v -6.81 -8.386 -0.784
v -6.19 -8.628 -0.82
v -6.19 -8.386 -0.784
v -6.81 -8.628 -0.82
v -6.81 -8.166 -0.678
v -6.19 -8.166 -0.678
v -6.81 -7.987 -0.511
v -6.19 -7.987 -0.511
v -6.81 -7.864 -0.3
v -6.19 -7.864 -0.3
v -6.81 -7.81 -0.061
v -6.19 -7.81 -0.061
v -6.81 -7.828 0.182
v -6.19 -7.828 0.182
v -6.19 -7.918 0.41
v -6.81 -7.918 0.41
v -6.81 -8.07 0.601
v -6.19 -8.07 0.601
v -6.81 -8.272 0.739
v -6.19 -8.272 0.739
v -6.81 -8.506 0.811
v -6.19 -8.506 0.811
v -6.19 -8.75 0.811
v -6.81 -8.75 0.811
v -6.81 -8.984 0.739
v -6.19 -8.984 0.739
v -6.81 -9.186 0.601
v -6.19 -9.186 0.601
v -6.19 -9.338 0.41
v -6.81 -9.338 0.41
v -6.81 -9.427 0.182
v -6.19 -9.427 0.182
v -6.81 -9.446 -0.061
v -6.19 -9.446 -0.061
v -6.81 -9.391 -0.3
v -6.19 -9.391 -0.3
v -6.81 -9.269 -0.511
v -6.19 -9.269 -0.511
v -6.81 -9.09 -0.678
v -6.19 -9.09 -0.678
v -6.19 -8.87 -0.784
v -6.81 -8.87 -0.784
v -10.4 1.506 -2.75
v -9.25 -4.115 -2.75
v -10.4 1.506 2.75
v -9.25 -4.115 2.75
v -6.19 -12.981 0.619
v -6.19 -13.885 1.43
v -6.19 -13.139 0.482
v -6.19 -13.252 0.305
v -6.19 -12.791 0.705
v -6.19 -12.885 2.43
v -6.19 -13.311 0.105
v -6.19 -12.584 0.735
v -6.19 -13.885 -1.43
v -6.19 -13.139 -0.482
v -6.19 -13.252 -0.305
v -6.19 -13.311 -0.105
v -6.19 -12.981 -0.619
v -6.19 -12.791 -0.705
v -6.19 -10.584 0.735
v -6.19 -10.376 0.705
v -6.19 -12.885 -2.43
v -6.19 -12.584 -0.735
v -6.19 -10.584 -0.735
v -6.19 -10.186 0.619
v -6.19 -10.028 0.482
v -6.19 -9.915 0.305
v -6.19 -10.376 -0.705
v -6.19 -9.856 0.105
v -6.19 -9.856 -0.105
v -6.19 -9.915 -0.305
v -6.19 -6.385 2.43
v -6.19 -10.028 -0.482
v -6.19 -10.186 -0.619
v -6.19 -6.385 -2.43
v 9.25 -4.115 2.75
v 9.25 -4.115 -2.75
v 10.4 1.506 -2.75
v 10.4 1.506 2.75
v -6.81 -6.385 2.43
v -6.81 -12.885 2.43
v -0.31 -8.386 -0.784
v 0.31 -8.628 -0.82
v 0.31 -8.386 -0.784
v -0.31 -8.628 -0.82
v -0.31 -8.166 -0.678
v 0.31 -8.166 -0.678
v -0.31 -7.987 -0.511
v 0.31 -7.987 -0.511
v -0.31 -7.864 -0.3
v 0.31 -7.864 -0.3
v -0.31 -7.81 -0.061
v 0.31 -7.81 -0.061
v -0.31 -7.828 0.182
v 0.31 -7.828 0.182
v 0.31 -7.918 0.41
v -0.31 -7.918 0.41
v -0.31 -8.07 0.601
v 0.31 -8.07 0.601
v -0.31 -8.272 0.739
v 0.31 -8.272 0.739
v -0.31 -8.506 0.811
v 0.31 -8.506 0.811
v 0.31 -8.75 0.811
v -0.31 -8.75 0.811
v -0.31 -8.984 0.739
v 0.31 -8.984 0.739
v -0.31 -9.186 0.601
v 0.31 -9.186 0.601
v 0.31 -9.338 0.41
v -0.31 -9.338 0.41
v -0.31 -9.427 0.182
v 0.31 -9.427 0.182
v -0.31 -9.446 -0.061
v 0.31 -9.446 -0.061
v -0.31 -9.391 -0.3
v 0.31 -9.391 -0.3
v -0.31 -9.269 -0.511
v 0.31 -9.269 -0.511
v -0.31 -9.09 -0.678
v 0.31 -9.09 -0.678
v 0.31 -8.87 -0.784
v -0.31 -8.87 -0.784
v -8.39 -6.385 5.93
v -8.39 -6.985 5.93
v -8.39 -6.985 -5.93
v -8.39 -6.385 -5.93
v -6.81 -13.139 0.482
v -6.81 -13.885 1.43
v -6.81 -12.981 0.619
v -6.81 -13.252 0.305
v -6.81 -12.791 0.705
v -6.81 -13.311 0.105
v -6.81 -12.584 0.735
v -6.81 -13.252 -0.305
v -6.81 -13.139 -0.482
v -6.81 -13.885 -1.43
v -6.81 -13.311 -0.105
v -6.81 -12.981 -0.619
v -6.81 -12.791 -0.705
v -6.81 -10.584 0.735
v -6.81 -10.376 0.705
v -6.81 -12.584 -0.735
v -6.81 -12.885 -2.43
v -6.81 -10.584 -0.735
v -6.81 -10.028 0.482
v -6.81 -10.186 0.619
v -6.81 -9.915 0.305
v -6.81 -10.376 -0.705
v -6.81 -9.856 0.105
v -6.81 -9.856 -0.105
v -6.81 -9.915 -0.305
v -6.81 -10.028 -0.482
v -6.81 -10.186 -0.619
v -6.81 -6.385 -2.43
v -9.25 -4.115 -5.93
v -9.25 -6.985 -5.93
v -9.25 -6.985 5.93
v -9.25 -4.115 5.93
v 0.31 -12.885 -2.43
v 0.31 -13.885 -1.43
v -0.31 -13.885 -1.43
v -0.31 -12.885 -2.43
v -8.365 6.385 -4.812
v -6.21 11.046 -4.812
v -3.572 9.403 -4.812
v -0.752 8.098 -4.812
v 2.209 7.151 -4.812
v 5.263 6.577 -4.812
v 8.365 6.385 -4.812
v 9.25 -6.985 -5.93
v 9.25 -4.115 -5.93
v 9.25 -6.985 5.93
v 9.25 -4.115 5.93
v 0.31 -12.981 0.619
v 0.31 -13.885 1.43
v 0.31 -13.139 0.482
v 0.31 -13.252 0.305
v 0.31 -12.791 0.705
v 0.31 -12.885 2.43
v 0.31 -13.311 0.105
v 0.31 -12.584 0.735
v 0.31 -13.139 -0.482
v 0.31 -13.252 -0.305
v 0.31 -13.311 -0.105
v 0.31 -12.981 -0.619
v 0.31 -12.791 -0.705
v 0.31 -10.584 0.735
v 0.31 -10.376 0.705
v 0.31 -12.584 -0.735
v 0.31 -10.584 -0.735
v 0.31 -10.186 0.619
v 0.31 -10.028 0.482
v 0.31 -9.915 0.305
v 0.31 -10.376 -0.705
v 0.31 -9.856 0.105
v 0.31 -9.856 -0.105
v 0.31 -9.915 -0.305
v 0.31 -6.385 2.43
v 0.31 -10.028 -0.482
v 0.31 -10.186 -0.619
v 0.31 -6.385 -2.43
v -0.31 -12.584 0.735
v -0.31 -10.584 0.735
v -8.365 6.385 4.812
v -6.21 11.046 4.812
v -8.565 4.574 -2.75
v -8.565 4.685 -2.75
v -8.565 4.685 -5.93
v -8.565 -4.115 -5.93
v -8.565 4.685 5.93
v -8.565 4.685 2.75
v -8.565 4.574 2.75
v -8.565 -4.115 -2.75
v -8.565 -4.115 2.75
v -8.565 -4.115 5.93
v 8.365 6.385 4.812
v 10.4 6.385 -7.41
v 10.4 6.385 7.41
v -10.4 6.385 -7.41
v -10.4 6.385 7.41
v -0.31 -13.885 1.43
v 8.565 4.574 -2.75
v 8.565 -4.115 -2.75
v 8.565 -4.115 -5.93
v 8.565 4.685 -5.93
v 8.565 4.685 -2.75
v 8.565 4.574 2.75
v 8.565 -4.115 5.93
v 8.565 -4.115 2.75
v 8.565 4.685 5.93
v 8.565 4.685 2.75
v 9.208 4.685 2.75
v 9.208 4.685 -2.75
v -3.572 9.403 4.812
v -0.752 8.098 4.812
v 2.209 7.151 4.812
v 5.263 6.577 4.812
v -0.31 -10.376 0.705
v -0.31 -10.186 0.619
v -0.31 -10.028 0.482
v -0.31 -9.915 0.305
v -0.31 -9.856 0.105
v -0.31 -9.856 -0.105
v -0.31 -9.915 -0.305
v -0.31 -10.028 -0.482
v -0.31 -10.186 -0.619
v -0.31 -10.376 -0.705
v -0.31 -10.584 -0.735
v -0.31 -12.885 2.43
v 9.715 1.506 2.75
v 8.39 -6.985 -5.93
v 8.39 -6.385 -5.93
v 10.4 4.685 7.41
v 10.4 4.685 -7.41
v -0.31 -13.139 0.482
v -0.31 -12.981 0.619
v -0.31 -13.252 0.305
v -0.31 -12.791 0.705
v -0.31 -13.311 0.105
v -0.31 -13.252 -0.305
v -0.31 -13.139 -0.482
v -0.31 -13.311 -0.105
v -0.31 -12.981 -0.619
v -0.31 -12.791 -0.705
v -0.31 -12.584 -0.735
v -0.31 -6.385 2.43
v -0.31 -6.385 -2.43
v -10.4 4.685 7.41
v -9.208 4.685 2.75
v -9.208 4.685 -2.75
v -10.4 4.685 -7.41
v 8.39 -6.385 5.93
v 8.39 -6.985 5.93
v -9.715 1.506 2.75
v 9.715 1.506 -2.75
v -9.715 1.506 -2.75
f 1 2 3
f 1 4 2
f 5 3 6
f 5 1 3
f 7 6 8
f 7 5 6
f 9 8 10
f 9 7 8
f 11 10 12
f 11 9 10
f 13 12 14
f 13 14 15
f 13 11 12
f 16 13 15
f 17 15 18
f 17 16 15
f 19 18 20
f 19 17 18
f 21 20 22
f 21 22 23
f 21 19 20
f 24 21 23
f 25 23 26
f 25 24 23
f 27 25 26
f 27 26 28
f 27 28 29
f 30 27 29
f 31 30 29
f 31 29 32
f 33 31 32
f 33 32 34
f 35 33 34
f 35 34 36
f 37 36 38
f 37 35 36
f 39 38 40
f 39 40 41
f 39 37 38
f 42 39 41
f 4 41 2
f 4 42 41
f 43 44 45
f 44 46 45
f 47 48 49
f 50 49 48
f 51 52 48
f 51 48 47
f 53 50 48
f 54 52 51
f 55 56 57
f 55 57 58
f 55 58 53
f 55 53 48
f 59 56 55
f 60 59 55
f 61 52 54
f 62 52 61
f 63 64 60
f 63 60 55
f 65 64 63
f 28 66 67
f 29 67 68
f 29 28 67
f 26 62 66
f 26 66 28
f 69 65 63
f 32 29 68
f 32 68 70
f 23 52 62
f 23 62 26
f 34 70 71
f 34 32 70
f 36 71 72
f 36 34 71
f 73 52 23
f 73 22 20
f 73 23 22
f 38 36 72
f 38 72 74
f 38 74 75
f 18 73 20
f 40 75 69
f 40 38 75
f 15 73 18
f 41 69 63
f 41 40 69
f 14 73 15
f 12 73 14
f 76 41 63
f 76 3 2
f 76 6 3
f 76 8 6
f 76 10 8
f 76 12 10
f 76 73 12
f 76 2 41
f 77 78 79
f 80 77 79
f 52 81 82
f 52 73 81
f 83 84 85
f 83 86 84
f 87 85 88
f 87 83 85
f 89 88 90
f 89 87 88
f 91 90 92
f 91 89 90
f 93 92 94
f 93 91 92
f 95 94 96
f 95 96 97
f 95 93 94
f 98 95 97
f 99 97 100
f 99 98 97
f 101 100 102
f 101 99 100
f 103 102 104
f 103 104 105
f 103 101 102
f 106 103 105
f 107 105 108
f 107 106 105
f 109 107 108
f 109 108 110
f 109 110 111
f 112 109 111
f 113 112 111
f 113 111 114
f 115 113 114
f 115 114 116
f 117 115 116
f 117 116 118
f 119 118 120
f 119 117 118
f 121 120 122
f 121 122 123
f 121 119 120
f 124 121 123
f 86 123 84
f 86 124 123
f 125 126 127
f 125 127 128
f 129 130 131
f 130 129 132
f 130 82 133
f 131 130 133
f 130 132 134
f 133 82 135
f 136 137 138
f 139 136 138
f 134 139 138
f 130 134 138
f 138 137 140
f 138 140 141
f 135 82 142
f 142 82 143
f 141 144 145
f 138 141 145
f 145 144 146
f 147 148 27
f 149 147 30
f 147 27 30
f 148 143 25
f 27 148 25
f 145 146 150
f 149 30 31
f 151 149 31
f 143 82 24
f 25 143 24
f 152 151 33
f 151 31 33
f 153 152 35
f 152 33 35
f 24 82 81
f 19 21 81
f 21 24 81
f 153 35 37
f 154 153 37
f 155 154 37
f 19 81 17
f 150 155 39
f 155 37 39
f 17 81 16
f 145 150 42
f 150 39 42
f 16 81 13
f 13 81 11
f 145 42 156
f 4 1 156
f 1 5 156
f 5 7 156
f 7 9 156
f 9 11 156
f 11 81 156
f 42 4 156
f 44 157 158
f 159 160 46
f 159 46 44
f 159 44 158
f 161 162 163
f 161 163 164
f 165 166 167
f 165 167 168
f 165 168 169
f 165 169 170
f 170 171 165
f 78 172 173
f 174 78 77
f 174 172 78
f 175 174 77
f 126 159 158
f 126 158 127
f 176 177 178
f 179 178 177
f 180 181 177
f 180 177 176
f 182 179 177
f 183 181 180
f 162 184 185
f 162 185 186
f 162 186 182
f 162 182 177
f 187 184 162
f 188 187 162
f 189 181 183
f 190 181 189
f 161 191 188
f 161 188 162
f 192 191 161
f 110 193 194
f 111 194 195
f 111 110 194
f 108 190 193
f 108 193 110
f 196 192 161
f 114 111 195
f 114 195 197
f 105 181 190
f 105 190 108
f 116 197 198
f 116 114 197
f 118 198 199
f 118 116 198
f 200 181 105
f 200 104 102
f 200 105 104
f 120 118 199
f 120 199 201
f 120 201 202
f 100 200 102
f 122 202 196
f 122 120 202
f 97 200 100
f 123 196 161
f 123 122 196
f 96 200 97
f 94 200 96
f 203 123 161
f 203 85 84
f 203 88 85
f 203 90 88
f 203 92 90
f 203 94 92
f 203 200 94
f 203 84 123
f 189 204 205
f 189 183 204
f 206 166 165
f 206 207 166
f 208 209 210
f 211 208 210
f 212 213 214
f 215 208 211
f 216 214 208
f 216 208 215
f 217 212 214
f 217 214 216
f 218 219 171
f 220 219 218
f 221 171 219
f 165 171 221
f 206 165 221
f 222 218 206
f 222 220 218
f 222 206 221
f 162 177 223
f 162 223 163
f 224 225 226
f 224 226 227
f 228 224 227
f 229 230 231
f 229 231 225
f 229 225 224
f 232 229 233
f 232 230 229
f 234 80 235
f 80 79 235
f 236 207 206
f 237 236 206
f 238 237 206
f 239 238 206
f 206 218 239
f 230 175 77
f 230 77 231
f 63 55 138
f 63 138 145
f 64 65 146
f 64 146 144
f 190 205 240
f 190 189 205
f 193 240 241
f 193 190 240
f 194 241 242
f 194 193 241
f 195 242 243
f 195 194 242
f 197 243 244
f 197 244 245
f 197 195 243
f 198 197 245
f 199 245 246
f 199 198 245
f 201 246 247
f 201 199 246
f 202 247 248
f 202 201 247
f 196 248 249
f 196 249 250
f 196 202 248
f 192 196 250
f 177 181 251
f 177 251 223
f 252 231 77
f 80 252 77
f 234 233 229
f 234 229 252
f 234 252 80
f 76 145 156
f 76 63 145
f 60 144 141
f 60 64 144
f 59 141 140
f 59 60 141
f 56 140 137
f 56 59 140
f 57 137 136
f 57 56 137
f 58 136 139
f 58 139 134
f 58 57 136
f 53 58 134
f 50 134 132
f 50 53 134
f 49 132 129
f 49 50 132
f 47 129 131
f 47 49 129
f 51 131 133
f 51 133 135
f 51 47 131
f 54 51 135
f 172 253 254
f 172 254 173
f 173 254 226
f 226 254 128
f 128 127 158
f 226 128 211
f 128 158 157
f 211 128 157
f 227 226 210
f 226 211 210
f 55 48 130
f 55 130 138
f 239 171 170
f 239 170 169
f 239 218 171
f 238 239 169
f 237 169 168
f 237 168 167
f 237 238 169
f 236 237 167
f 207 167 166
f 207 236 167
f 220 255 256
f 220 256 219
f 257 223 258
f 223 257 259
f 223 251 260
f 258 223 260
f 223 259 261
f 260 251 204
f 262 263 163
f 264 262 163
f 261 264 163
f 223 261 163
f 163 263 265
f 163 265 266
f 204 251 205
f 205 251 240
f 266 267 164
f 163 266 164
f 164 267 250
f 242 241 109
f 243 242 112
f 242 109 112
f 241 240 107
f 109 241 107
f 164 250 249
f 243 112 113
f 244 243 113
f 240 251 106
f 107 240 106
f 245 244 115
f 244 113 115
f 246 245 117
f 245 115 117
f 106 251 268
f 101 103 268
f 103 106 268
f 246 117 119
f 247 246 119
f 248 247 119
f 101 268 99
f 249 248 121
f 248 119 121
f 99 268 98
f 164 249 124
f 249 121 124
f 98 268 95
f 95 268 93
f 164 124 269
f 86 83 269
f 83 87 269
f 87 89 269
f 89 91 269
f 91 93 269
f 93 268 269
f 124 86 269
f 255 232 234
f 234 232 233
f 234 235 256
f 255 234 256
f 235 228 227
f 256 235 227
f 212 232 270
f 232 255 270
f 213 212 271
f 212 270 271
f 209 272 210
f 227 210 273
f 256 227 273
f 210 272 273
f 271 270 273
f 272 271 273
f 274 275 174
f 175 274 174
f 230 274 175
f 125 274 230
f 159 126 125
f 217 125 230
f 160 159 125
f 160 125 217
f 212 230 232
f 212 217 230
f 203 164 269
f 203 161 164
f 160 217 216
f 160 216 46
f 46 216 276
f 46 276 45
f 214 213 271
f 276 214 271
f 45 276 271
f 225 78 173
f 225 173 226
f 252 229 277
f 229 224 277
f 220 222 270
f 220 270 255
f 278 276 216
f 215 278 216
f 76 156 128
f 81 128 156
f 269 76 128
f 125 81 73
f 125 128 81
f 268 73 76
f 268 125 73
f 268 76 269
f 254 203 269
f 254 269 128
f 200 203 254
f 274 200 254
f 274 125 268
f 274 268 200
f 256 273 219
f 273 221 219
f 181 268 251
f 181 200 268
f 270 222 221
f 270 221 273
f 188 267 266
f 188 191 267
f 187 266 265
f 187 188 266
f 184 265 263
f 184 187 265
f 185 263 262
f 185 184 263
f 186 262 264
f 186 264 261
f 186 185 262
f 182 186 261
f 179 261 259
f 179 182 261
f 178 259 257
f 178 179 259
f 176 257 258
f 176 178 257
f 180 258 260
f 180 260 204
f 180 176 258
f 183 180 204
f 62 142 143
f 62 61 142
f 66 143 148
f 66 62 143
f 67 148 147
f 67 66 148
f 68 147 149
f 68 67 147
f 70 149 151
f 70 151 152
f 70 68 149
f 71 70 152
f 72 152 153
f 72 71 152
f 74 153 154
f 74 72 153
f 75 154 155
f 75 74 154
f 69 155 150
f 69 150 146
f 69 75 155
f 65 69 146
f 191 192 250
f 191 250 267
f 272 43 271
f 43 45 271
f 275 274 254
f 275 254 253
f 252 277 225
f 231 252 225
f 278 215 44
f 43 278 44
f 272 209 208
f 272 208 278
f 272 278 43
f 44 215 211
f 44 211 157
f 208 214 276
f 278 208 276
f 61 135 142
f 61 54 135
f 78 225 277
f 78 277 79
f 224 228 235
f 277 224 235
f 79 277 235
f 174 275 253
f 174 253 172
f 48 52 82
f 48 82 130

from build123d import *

# Parameters (mm, degrees)
BOSS_EXTRUDE1_DEPTH     = 7.41
CUT_EXTRUDE1_DEPTH      = 15.555353826
CUT_EXTRUDE1_DEPTH_BACK = 15.555353826
SKETCH2_W               = 1.48
SKETCH2_H               = 11.67
BOSS_EXTRUDE2_DEPTH     = 2.75
BOSS_EXTRUDE3_DEPTH     = 4.8125
SKETCH6_R               = 0.820137038
BOSS_EXTRUDE4_DEPTH     = 0.31
LPATTERN1_COUNT         = 2
LPATTERN1_PITCH         = 6.5


with BuildPart() as part:
    # Sketch1 → Boss-Extrude1 (new, symmetric)
    with BuildSketch(Plane.XY):
        Polygon((8.39, -6.985), (9.25, -6.985), (9.25, -4.115), (8.565, -4.115), (8.565, 4.685), (10.4, 4.685), (10.4, 6.385), (-10.4, 6.385), (-10.4, 4.685), (-8.565, 4.685), (-8.565, -4.115), (-9.25, -4.115), (-9.25, -6.985), (-8.39, -6.985), (-8.39, -6.385), (8.39, -6.385), align=None)
    extrude(amount=BOSS_EXTRUDE1_DEPTH, both=True)

    # Sketch2 → Cut-Extrude1 (cut, two sides: drawn at the far end of the back side and taken through both)
    with BuildSketch(Plane(origin=(0, 0, 0), x_dir=(0, 0, -1), z_dir=(1, 0, 0)).offset(-CUT_EXTRUDE1_DEPTH_BACK)):
        with Locations((-6.67, -1.15)):
            Rectangle(SKETCH2_W, SKETCH2_H)
        with Locations((6.67, -1.15)):
            Rectangle(SKETCH2_W, SKETCH2_H)
    extrude(amount=CUT_EXTRUDE1_DEPTH + CUT_EXTRUDE1_DEPTH_BACK, mode=Mode.SUBTRACT)

    # Sketch3 → Boss-Extrude2 (add, symmetric)
    with BuildSketch(Plane.XY):
        Polygon((9.25, -4.115), (10.4, 1.505688207), (9.208432641, 4.685), (8.565, 4.685), (8.565, 4.574090958), (9.715, 1.505688207), (8.565, -4.115), align=None)
        Polygon((-8.565, -4.115), (-9.25, -4.115), (-10.4, 1.505688207), (-9.208432641, 4.685), (-8.565, 4.685), (-8.565, 4.574090958), (-9.715, 1.505688207), align=None)
    extrude(amount=BOSS_EXTRUDE2_DEPTH, both=True)

    # Sketch4 → Boss-Extrude3 (add, symmetric)
    with BuildSketch(Plane.XY):
        with BuildLine():
            Line((-6.210173318, 11.046483266), (-8.365, 6.385))
            Line((-8.365, 6.385), (8.365, 6.385))
            ThreePointArc((8.365, 6.385), (0.713772917, 7.578738259), (-6.210173318, 11.046483266))
        make_face()
    extrude(amount=BOSS_EXTRUDE3_DEPTH, both=True)

    # Sketch6 → Boss-Extrude4 (add, symmetric)
    with BuildSketch(Plane(origin=(0, 0, 0), x_dir=(0, 0, -1), z_dir=(1, 0, 0))):
        Polygon((-2.43, -6.385), (-2.43, -12.885), (-1.43, -13.885), (1.43, -13.885), (2.43, -12.885), (2.43, -6.385), align=None)
        with Locations((0, -8.62789293)):
            Circle(SKETCH6_R, mode=Mode.SUBTRACT)
        with BuildLine():
            Line((0.735277294, -10.583561043), (0.735277294, -12.583561043))
            ThreePointArc((0.735277294, -12.583561043), (0, -13.318838337), (-0.735277294, -12.583561043))
            Line((-0.735277294, -12.583561043), (-0.735277294, -10.583561043))
            ThreePointArc((-0.735277294, -10.583561043), (0, -9.848283749), (0.735277294, -10.583561043))
        make_face(mode=Mode.SUBTRACT)
    boss_extrude4 = extrude(amount=BOSS_EXTRUDE4_DEPTH, both=True)

    # LPattern1: Boss-Extrude4 ×2
    with Locations(*[(-i * LPATTERN1_PITCH, 0, 0) for i in range(1, LPATTERN1_COUNT)]):
        add(boss_extrude4)


solid = part.part
